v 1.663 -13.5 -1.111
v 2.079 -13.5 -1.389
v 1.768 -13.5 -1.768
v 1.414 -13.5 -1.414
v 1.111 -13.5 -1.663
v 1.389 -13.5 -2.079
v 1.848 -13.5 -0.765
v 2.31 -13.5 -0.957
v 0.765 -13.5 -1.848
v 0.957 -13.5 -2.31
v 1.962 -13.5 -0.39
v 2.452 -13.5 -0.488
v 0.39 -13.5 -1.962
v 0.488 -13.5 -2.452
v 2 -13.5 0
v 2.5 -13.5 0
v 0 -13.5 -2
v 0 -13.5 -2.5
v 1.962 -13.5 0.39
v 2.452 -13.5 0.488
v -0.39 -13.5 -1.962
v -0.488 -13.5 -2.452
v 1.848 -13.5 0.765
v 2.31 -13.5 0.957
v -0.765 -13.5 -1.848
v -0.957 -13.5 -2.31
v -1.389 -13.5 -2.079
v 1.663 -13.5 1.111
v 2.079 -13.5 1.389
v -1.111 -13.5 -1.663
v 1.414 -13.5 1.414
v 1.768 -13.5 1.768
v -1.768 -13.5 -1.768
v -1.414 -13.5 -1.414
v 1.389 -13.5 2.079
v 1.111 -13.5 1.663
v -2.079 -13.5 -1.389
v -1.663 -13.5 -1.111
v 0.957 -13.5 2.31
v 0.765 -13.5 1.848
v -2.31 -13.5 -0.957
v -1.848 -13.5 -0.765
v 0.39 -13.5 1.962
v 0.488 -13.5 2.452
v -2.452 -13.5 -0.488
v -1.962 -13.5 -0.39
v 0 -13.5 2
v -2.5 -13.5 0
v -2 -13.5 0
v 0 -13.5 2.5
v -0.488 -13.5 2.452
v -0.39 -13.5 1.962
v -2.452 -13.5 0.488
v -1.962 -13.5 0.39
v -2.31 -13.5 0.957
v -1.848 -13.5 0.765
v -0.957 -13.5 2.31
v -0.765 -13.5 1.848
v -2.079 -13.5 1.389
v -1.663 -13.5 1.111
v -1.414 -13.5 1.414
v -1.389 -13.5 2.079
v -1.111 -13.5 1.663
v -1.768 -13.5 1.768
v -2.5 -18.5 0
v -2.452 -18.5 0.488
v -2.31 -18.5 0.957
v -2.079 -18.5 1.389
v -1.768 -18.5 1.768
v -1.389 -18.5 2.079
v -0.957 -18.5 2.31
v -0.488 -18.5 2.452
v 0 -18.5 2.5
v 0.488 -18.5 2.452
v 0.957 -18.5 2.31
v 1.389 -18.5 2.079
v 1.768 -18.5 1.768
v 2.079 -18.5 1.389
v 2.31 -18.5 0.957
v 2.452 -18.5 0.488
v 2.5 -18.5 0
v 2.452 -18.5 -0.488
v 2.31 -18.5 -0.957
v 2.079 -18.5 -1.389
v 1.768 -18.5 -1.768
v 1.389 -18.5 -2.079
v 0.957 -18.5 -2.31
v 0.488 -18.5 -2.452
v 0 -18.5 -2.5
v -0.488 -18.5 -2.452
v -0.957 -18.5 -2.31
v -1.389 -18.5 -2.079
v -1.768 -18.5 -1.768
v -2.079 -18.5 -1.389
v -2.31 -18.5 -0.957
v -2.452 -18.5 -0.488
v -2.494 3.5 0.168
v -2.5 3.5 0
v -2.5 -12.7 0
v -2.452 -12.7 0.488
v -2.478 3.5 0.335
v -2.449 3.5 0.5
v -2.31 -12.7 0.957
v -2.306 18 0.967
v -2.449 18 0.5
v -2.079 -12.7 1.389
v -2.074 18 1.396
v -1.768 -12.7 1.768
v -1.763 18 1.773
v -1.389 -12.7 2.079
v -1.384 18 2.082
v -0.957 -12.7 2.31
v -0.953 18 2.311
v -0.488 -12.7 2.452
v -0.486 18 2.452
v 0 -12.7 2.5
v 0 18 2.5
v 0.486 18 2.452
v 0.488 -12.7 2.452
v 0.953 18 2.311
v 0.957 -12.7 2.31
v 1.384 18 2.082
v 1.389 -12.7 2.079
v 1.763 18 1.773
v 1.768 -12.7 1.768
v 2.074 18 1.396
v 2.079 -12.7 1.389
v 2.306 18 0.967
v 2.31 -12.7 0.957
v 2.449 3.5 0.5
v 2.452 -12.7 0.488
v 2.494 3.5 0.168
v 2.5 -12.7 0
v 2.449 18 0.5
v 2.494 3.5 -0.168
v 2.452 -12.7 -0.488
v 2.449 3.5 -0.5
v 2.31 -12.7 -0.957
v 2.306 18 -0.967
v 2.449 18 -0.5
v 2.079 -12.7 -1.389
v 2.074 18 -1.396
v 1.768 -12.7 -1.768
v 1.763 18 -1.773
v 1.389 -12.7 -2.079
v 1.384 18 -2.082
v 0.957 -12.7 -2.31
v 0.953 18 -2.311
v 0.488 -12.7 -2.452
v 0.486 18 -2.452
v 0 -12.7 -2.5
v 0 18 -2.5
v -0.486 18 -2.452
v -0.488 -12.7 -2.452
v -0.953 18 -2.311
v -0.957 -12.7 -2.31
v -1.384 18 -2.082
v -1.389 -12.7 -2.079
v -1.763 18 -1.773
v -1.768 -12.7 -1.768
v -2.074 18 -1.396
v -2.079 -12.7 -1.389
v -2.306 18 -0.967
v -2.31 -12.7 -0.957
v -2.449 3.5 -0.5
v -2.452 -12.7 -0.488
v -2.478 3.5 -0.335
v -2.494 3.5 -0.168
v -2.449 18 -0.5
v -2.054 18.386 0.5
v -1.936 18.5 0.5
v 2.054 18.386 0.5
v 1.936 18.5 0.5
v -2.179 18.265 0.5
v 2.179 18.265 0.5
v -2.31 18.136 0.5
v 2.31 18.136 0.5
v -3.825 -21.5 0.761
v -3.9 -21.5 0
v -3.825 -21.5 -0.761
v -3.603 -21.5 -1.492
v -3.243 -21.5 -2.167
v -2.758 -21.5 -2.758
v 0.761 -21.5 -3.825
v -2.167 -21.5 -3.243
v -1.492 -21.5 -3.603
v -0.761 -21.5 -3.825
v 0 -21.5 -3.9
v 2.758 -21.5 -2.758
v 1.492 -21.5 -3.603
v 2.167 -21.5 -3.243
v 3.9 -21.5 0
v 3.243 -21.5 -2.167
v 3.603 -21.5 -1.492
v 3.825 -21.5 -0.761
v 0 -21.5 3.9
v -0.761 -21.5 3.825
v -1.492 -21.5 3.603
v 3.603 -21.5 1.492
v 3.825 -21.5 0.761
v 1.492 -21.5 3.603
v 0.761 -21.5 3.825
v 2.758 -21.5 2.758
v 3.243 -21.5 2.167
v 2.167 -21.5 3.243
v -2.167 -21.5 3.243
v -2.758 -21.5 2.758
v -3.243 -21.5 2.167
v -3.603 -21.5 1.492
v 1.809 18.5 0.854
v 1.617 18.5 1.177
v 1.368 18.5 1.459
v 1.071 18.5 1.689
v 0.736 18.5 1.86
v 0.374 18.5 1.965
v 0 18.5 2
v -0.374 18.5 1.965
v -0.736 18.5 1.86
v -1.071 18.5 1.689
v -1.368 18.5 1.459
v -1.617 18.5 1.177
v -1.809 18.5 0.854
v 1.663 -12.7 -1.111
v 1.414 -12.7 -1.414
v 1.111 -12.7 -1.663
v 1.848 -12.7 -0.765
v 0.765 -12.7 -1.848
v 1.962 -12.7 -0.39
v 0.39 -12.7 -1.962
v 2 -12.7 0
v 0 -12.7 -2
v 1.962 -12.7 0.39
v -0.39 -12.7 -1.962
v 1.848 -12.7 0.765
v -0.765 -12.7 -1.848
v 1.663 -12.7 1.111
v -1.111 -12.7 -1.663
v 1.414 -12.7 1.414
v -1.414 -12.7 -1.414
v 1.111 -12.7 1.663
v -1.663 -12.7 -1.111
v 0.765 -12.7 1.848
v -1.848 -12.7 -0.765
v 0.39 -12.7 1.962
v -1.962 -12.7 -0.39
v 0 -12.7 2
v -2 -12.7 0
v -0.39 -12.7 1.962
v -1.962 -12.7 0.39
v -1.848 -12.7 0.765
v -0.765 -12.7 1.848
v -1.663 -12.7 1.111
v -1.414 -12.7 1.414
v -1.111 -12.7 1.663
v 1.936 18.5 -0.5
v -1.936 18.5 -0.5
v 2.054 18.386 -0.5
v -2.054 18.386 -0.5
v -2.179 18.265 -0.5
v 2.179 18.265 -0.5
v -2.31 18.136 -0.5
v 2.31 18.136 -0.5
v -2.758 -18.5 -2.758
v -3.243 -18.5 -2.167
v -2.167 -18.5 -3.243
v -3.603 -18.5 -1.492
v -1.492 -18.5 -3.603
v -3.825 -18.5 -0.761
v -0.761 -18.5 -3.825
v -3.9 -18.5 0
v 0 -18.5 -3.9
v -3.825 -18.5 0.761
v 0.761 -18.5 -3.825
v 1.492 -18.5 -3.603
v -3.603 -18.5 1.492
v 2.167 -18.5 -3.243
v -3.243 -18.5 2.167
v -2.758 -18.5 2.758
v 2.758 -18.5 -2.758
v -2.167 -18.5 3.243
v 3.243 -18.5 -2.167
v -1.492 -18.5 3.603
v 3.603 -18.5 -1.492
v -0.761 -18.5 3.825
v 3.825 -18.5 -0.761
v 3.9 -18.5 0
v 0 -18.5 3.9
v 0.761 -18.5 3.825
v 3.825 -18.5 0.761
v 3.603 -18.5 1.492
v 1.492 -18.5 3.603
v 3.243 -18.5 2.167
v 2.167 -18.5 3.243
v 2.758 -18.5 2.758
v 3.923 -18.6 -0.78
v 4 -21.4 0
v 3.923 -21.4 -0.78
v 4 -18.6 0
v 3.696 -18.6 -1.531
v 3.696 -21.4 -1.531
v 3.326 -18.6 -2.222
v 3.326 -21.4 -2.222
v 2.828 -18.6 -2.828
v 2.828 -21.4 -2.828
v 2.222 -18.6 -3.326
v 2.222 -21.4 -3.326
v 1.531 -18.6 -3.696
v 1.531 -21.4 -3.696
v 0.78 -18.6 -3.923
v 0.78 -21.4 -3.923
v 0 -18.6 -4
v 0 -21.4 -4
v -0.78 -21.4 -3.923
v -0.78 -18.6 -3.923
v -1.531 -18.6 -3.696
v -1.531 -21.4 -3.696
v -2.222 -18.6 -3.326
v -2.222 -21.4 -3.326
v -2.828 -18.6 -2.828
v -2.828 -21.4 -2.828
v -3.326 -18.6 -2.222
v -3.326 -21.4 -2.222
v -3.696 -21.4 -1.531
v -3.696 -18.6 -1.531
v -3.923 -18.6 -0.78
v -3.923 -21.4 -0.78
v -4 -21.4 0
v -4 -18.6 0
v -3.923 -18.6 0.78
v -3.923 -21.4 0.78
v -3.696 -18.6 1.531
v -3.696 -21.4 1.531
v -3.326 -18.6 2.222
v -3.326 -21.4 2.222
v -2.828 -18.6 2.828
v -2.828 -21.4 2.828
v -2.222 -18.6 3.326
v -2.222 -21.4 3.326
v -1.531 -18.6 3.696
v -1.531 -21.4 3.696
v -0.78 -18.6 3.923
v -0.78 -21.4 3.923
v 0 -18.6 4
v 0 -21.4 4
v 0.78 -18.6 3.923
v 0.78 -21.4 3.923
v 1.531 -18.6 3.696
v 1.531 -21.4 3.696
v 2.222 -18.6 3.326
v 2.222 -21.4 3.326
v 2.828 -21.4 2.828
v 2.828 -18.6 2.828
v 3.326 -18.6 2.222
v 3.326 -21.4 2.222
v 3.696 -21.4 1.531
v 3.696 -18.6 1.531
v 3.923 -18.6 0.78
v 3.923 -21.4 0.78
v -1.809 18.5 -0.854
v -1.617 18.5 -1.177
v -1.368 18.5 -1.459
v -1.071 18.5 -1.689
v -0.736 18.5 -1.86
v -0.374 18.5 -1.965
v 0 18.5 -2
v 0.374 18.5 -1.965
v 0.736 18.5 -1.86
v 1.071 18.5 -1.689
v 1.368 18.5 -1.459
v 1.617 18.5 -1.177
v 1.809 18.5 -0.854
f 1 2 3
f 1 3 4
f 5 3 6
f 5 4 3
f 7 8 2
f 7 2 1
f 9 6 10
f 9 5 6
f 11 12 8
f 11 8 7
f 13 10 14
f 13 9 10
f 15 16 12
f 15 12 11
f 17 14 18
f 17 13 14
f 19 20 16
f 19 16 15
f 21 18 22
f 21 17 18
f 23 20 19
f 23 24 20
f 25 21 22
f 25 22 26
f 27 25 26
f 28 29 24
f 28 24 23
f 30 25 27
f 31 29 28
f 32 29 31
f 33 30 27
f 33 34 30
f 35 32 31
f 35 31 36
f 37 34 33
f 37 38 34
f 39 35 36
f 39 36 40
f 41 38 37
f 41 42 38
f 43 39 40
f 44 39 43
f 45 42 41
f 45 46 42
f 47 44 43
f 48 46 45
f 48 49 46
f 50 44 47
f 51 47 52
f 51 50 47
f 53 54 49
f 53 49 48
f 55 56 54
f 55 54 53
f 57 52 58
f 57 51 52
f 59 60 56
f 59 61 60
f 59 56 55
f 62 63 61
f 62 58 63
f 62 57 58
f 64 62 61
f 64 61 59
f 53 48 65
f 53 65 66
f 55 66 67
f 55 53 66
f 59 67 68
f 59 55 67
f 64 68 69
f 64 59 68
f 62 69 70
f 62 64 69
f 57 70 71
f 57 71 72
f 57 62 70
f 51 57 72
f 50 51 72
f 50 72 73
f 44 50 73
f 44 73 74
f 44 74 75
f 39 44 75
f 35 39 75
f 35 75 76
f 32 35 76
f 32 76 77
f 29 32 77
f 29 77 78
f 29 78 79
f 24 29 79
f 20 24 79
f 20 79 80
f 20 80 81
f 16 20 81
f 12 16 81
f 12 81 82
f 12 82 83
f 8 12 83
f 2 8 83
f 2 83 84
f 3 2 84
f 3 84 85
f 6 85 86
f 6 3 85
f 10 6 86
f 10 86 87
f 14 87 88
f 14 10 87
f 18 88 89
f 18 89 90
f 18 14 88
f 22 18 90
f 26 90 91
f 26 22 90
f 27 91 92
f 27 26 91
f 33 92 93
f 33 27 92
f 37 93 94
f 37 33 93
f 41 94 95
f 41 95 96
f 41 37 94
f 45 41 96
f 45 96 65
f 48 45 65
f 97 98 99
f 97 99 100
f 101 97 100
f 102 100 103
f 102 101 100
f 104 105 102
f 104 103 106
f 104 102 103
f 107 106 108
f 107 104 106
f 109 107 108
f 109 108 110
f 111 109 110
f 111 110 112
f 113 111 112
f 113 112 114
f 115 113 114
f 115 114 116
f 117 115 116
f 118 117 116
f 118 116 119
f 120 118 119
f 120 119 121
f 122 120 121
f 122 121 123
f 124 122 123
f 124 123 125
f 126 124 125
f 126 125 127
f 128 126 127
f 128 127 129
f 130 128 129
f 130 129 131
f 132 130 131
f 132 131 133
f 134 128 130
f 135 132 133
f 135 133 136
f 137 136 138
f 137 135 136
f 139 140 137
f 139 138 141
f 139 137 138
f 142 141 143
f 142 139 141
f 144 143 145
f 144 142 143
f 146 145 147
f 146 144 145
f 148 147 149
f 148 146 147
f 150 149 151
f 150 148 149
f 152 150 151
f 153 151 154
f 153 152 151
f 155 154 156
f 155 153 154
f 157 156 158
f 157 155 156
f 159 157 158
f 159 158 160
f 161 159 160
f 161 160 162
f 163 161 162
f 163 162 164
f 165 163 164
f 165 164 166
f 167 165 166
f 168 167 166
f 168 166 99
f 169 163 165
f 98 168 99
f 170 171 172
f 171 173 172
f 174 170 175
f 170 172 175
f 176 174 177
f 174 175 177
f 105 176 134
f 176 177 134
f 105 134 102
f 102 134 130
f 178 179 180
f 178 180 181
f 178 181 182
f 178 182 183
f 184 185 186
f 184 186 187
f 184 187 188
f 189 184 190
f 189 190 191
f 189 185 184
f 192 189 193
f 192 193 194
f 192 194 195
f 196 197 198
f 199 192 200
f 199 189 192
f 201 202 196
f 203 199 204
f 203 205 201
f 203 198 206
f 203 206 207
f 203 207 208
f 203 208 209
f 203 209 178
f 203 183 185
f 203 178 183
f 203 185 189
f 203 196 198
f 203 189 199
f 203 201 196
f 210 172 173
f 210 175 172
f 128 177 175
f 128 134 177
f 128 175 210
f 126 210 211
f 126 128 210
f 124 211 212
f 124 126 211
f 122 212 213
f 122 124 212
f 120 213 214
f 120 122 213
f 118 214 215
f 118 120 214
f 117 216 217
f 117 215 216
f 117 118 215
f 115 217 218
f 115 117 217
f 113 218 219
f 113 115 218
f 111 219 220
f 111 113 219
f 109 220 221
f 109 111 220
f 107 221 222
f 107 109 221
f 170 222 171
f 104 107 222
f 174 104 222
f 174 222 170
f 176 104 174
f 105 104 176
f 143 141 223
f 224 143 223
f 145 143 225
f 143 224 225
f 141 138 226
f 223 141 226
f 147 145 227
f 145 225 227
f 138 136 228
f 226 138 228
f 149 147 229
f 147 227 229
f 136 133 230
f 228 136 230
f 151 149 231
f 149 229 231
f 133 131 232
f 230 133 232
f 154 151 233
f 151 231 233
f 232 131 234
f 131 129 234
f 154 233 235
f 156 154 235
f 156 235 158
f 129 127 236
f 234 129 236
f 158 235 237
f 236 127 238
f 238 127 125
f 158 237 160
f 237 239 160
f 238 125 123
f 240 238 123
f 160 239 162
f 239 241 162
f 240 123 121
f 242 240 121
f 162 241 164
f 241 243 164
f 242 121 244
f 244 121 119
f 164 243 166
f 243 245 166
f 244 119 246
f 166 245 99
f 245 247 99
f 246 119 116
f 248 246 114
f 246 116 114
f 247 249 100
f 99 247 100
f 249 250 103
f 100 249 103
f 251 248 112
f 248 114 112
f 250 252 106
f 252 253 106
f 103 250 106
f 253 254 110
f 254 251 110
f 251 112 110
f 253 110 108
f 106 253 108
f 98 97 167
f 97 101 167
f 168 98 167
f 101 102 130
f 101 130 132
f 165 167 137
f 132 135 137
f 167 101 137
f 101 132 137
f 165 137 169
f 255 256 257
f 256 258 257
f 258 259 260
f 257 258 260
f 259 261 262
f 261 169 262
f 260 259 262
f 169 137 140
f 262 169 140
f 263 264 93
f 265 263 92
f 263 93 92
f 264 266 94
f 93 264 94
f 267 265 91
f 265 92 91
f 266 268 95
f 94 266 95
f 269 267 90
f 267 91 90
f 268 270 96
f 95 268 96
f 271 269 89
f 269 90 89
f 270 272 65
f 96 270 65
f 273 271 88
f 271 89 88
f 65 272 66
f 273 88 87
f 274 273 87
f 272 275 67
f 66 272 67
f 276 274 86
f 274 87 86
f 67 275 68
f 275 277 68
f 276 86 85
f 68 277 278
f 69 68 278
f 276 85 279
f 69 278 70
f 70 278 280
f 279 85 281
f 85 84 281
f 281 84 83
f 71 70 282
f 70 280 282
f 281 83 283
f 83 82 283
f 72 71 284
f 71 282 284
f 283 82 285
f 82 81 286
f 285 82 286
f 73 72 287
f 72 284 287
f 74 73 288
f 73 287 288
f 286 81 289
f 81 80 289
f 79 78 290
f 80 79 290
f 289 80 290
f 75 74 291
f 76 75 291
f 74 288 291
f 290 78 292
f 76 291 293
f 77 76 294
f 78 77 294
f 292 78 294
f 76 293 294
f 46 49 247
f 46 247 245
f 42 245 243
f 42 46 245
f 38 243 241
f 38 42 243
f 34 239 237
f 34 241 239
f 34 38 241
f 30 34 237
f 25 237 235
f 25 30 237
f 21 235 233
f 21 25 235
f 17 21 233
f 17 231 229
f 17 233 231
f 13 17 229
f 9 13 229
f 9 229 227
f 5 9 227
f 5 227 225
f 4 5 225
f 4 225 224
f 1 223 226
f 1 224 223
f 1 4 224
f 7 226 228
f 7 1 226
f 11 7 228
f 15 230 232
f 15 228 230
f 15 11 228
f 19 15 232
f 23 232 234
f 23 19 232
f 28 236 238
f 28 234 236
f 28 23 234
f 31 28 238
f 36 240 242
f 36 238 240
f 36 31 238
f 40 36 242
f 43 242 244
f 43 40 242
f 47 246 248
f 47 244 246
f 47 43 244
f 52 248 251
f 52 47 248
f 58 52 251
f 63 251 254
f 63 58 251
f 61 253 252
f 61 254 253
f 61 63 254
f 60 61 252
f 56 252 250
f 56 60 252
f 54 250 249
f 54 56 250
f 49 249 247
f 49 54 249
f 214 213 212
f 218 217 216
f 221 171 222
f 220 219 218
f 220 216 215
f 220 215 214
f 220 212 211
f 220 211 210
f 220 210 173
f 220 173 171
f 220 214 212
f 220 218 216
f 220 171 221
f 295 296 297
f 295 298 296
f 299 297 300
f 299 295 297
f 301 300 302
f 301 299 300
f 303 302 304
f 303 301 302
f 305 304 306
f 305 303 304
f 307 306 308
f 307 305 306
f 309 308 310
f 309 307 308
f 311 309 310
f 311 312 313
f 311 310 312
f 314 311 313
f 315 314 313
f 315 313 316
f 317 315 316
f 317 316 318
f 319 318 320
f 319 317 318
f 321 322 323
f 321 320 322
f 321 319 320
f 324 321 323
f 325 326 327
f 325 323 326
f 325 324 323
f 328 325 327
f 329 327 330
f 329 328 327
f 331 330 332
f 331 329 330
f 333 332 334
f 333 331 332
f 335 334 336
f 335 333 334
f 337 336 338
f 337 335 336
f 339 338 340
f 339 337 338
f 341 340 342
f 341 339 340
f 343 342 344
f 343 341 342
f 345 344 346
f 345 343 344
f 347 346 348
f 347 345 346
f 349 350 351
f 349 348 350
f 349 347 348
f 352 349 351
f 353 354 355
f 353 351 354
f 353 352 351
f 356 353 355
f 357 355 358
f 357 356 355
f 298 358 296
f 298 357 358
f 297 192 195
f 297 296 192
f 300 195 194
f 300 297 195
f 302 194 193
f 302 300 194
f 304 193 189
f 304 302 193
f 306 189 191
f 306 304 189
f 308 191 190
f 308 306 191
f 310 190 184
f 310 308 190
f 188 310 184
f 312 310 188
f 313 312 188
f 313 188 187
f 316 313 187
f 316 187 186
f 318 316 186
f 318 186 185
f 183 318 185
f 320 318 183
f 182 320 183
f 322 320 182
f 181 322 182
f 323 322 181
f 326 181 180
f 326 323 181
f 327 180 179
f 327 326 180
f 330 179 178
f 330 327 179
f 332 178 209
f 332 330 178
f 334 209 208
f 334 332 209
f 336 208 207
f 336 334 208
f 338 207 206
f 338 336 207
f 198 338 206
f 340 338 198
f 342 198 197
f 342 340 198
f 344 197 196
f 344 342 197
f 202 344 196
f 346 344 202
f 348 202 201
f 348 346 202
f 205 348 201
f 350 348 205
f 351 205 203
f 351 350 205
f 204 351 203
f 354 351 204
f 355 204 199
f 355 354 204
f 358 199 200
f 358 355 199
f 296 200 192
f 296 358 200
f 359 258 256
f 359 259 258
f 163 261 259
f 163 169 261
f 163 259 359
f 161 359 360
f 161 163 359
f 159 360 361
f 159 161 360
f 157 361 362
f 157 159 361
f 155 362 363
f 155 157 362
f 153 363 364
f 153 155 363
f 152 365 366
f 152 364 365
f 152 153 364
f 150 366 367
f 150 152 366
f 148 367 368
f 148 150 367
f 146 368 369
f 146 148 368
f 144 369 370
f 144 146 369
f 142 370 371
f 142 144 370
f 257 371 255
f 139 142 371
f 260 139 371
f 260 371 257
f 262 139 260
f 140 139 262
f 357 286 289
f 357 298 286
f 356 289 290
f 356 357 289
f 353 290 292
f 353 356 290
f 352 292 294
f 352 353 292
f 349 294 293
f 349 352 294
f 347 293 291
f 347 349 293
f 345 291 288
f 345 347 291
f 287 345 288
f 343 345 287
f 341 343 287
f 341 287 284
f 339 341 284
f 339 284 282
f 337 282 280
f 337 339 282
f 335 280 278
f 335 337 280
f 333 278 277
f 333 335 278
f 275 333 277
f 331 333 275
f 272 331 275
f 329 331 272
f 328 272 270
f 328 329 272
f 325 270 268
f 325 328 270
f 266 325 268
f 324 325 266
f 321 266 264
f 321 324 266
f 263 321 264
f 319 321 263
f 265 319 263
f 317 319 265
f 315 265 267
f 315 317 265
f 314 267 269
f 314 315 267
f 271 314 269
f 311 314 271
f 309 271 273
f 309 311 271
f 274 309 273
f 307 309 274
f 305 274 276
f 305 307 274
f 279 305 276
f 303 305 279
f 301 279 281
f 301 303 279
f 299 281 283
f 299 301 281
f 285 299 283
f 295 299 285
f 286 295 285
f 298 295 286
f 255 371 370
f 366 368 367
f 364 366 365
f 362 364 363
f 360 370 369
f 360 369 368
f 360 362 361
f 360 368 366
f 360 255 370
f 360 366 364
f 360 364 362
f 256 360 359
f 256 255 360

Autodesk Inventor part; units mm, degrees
ref_plane "YZ Plane" through (0, 0, 0) normal (1, 0, 0) x (0, 1, 0)
ref_plane "XZ Plane" through (0, 0, 0) normal (0, 1, 0) x (-1, 0, 0)
ref_plane "XY Plane" through (0, 0, 0) normal (0, 0, 1) x (1, 0, 0)
sketch "Sketch4" plane through (0, 0, 0) normal (0, 1, 0) x (-1, 0, 0)
  circle A0 centre (0, 0) radius 2.5
extrude "Extrusion2" add sketch "Sketch4" along normal mid plane 37
chamfer "Chamfer1" distance 0.5 angle 45 1 edges at (2.5, 18.5, 0)
sketch "Sketch14" plane through (0, -18.5, 0) normal (0, -1, 0) x (1, 0, 0)
  circle A0 centre (0, 0) radius 4
  dimension "d101" = 8
extrude "Extrusion10" add sketch "Sketch14" along normal blind 3
sketch "Sketch15" plane through (0, 0, 0) normal (0, 0, 1) x (1, 0, 0)
  line L0 (-2.5, -18.5) -> (-2.5, 18) projected
  line L1 (-2.5, -12.7) -> (-2, -12.7)
  line L2 (-2, -12.7) -> (-2, -13.5)
  line L3 (-2, -13.5) -> (-2.5, -13.5)
  line L4 (-2.5, -13.5) -> (-2.5, -12.7)
  line L5 (0, -22.5133) -> (0, 22.052) construction
  line L6 (-4, -18.5) -> (4, -18.5) projected
  point P0 (0, 0)
  dimension "d104" = 2
  dimension "d105" = 0.8
  dimension "d106" = 5
revolve "Revolution1" cut sketch "Sketch15" angle 360 about axis through (0, -22.5133, 0) along (0, 1, 0)
chamfer "Chamfer2" distance 0.1 angle 45 2 edges at (-4, -18.5, 0) (-4, -21.5, 0)
sketch "Sketch16" plane through (0, 0, 0) normal (1, 0, 0) x (0, 1, 0)
  line L0 (28.5, 0.5) -> (3.5, 0.5)
  line L1 (3.5, 0.5) -> (3.5, -0.5)
  line L2 (3.5, -0.5) -> (28.5, -0.5)
  line L3 (28.5, -0.5) -> (28.5, 0.5)
  line L4 (28.5, 0.5) -> (3.5, -0.5) construction
  line L5 (3.5, 0.5) -> (28.5, -0.5) construction
  line L6 (18.5, 2) -> (18.5, -2) projected
  point P0 (0, 0)
  point P1 (16, 0)
  dimension "d111" = 15
  dimension "d112" = 1
  dimension "d115" = 10
extrude "Extrusion11" cut sketch "Sketch16" against normal mid plane 7.75
properties part number "Wheel Handle" material "Bronze, Soft Tin"
